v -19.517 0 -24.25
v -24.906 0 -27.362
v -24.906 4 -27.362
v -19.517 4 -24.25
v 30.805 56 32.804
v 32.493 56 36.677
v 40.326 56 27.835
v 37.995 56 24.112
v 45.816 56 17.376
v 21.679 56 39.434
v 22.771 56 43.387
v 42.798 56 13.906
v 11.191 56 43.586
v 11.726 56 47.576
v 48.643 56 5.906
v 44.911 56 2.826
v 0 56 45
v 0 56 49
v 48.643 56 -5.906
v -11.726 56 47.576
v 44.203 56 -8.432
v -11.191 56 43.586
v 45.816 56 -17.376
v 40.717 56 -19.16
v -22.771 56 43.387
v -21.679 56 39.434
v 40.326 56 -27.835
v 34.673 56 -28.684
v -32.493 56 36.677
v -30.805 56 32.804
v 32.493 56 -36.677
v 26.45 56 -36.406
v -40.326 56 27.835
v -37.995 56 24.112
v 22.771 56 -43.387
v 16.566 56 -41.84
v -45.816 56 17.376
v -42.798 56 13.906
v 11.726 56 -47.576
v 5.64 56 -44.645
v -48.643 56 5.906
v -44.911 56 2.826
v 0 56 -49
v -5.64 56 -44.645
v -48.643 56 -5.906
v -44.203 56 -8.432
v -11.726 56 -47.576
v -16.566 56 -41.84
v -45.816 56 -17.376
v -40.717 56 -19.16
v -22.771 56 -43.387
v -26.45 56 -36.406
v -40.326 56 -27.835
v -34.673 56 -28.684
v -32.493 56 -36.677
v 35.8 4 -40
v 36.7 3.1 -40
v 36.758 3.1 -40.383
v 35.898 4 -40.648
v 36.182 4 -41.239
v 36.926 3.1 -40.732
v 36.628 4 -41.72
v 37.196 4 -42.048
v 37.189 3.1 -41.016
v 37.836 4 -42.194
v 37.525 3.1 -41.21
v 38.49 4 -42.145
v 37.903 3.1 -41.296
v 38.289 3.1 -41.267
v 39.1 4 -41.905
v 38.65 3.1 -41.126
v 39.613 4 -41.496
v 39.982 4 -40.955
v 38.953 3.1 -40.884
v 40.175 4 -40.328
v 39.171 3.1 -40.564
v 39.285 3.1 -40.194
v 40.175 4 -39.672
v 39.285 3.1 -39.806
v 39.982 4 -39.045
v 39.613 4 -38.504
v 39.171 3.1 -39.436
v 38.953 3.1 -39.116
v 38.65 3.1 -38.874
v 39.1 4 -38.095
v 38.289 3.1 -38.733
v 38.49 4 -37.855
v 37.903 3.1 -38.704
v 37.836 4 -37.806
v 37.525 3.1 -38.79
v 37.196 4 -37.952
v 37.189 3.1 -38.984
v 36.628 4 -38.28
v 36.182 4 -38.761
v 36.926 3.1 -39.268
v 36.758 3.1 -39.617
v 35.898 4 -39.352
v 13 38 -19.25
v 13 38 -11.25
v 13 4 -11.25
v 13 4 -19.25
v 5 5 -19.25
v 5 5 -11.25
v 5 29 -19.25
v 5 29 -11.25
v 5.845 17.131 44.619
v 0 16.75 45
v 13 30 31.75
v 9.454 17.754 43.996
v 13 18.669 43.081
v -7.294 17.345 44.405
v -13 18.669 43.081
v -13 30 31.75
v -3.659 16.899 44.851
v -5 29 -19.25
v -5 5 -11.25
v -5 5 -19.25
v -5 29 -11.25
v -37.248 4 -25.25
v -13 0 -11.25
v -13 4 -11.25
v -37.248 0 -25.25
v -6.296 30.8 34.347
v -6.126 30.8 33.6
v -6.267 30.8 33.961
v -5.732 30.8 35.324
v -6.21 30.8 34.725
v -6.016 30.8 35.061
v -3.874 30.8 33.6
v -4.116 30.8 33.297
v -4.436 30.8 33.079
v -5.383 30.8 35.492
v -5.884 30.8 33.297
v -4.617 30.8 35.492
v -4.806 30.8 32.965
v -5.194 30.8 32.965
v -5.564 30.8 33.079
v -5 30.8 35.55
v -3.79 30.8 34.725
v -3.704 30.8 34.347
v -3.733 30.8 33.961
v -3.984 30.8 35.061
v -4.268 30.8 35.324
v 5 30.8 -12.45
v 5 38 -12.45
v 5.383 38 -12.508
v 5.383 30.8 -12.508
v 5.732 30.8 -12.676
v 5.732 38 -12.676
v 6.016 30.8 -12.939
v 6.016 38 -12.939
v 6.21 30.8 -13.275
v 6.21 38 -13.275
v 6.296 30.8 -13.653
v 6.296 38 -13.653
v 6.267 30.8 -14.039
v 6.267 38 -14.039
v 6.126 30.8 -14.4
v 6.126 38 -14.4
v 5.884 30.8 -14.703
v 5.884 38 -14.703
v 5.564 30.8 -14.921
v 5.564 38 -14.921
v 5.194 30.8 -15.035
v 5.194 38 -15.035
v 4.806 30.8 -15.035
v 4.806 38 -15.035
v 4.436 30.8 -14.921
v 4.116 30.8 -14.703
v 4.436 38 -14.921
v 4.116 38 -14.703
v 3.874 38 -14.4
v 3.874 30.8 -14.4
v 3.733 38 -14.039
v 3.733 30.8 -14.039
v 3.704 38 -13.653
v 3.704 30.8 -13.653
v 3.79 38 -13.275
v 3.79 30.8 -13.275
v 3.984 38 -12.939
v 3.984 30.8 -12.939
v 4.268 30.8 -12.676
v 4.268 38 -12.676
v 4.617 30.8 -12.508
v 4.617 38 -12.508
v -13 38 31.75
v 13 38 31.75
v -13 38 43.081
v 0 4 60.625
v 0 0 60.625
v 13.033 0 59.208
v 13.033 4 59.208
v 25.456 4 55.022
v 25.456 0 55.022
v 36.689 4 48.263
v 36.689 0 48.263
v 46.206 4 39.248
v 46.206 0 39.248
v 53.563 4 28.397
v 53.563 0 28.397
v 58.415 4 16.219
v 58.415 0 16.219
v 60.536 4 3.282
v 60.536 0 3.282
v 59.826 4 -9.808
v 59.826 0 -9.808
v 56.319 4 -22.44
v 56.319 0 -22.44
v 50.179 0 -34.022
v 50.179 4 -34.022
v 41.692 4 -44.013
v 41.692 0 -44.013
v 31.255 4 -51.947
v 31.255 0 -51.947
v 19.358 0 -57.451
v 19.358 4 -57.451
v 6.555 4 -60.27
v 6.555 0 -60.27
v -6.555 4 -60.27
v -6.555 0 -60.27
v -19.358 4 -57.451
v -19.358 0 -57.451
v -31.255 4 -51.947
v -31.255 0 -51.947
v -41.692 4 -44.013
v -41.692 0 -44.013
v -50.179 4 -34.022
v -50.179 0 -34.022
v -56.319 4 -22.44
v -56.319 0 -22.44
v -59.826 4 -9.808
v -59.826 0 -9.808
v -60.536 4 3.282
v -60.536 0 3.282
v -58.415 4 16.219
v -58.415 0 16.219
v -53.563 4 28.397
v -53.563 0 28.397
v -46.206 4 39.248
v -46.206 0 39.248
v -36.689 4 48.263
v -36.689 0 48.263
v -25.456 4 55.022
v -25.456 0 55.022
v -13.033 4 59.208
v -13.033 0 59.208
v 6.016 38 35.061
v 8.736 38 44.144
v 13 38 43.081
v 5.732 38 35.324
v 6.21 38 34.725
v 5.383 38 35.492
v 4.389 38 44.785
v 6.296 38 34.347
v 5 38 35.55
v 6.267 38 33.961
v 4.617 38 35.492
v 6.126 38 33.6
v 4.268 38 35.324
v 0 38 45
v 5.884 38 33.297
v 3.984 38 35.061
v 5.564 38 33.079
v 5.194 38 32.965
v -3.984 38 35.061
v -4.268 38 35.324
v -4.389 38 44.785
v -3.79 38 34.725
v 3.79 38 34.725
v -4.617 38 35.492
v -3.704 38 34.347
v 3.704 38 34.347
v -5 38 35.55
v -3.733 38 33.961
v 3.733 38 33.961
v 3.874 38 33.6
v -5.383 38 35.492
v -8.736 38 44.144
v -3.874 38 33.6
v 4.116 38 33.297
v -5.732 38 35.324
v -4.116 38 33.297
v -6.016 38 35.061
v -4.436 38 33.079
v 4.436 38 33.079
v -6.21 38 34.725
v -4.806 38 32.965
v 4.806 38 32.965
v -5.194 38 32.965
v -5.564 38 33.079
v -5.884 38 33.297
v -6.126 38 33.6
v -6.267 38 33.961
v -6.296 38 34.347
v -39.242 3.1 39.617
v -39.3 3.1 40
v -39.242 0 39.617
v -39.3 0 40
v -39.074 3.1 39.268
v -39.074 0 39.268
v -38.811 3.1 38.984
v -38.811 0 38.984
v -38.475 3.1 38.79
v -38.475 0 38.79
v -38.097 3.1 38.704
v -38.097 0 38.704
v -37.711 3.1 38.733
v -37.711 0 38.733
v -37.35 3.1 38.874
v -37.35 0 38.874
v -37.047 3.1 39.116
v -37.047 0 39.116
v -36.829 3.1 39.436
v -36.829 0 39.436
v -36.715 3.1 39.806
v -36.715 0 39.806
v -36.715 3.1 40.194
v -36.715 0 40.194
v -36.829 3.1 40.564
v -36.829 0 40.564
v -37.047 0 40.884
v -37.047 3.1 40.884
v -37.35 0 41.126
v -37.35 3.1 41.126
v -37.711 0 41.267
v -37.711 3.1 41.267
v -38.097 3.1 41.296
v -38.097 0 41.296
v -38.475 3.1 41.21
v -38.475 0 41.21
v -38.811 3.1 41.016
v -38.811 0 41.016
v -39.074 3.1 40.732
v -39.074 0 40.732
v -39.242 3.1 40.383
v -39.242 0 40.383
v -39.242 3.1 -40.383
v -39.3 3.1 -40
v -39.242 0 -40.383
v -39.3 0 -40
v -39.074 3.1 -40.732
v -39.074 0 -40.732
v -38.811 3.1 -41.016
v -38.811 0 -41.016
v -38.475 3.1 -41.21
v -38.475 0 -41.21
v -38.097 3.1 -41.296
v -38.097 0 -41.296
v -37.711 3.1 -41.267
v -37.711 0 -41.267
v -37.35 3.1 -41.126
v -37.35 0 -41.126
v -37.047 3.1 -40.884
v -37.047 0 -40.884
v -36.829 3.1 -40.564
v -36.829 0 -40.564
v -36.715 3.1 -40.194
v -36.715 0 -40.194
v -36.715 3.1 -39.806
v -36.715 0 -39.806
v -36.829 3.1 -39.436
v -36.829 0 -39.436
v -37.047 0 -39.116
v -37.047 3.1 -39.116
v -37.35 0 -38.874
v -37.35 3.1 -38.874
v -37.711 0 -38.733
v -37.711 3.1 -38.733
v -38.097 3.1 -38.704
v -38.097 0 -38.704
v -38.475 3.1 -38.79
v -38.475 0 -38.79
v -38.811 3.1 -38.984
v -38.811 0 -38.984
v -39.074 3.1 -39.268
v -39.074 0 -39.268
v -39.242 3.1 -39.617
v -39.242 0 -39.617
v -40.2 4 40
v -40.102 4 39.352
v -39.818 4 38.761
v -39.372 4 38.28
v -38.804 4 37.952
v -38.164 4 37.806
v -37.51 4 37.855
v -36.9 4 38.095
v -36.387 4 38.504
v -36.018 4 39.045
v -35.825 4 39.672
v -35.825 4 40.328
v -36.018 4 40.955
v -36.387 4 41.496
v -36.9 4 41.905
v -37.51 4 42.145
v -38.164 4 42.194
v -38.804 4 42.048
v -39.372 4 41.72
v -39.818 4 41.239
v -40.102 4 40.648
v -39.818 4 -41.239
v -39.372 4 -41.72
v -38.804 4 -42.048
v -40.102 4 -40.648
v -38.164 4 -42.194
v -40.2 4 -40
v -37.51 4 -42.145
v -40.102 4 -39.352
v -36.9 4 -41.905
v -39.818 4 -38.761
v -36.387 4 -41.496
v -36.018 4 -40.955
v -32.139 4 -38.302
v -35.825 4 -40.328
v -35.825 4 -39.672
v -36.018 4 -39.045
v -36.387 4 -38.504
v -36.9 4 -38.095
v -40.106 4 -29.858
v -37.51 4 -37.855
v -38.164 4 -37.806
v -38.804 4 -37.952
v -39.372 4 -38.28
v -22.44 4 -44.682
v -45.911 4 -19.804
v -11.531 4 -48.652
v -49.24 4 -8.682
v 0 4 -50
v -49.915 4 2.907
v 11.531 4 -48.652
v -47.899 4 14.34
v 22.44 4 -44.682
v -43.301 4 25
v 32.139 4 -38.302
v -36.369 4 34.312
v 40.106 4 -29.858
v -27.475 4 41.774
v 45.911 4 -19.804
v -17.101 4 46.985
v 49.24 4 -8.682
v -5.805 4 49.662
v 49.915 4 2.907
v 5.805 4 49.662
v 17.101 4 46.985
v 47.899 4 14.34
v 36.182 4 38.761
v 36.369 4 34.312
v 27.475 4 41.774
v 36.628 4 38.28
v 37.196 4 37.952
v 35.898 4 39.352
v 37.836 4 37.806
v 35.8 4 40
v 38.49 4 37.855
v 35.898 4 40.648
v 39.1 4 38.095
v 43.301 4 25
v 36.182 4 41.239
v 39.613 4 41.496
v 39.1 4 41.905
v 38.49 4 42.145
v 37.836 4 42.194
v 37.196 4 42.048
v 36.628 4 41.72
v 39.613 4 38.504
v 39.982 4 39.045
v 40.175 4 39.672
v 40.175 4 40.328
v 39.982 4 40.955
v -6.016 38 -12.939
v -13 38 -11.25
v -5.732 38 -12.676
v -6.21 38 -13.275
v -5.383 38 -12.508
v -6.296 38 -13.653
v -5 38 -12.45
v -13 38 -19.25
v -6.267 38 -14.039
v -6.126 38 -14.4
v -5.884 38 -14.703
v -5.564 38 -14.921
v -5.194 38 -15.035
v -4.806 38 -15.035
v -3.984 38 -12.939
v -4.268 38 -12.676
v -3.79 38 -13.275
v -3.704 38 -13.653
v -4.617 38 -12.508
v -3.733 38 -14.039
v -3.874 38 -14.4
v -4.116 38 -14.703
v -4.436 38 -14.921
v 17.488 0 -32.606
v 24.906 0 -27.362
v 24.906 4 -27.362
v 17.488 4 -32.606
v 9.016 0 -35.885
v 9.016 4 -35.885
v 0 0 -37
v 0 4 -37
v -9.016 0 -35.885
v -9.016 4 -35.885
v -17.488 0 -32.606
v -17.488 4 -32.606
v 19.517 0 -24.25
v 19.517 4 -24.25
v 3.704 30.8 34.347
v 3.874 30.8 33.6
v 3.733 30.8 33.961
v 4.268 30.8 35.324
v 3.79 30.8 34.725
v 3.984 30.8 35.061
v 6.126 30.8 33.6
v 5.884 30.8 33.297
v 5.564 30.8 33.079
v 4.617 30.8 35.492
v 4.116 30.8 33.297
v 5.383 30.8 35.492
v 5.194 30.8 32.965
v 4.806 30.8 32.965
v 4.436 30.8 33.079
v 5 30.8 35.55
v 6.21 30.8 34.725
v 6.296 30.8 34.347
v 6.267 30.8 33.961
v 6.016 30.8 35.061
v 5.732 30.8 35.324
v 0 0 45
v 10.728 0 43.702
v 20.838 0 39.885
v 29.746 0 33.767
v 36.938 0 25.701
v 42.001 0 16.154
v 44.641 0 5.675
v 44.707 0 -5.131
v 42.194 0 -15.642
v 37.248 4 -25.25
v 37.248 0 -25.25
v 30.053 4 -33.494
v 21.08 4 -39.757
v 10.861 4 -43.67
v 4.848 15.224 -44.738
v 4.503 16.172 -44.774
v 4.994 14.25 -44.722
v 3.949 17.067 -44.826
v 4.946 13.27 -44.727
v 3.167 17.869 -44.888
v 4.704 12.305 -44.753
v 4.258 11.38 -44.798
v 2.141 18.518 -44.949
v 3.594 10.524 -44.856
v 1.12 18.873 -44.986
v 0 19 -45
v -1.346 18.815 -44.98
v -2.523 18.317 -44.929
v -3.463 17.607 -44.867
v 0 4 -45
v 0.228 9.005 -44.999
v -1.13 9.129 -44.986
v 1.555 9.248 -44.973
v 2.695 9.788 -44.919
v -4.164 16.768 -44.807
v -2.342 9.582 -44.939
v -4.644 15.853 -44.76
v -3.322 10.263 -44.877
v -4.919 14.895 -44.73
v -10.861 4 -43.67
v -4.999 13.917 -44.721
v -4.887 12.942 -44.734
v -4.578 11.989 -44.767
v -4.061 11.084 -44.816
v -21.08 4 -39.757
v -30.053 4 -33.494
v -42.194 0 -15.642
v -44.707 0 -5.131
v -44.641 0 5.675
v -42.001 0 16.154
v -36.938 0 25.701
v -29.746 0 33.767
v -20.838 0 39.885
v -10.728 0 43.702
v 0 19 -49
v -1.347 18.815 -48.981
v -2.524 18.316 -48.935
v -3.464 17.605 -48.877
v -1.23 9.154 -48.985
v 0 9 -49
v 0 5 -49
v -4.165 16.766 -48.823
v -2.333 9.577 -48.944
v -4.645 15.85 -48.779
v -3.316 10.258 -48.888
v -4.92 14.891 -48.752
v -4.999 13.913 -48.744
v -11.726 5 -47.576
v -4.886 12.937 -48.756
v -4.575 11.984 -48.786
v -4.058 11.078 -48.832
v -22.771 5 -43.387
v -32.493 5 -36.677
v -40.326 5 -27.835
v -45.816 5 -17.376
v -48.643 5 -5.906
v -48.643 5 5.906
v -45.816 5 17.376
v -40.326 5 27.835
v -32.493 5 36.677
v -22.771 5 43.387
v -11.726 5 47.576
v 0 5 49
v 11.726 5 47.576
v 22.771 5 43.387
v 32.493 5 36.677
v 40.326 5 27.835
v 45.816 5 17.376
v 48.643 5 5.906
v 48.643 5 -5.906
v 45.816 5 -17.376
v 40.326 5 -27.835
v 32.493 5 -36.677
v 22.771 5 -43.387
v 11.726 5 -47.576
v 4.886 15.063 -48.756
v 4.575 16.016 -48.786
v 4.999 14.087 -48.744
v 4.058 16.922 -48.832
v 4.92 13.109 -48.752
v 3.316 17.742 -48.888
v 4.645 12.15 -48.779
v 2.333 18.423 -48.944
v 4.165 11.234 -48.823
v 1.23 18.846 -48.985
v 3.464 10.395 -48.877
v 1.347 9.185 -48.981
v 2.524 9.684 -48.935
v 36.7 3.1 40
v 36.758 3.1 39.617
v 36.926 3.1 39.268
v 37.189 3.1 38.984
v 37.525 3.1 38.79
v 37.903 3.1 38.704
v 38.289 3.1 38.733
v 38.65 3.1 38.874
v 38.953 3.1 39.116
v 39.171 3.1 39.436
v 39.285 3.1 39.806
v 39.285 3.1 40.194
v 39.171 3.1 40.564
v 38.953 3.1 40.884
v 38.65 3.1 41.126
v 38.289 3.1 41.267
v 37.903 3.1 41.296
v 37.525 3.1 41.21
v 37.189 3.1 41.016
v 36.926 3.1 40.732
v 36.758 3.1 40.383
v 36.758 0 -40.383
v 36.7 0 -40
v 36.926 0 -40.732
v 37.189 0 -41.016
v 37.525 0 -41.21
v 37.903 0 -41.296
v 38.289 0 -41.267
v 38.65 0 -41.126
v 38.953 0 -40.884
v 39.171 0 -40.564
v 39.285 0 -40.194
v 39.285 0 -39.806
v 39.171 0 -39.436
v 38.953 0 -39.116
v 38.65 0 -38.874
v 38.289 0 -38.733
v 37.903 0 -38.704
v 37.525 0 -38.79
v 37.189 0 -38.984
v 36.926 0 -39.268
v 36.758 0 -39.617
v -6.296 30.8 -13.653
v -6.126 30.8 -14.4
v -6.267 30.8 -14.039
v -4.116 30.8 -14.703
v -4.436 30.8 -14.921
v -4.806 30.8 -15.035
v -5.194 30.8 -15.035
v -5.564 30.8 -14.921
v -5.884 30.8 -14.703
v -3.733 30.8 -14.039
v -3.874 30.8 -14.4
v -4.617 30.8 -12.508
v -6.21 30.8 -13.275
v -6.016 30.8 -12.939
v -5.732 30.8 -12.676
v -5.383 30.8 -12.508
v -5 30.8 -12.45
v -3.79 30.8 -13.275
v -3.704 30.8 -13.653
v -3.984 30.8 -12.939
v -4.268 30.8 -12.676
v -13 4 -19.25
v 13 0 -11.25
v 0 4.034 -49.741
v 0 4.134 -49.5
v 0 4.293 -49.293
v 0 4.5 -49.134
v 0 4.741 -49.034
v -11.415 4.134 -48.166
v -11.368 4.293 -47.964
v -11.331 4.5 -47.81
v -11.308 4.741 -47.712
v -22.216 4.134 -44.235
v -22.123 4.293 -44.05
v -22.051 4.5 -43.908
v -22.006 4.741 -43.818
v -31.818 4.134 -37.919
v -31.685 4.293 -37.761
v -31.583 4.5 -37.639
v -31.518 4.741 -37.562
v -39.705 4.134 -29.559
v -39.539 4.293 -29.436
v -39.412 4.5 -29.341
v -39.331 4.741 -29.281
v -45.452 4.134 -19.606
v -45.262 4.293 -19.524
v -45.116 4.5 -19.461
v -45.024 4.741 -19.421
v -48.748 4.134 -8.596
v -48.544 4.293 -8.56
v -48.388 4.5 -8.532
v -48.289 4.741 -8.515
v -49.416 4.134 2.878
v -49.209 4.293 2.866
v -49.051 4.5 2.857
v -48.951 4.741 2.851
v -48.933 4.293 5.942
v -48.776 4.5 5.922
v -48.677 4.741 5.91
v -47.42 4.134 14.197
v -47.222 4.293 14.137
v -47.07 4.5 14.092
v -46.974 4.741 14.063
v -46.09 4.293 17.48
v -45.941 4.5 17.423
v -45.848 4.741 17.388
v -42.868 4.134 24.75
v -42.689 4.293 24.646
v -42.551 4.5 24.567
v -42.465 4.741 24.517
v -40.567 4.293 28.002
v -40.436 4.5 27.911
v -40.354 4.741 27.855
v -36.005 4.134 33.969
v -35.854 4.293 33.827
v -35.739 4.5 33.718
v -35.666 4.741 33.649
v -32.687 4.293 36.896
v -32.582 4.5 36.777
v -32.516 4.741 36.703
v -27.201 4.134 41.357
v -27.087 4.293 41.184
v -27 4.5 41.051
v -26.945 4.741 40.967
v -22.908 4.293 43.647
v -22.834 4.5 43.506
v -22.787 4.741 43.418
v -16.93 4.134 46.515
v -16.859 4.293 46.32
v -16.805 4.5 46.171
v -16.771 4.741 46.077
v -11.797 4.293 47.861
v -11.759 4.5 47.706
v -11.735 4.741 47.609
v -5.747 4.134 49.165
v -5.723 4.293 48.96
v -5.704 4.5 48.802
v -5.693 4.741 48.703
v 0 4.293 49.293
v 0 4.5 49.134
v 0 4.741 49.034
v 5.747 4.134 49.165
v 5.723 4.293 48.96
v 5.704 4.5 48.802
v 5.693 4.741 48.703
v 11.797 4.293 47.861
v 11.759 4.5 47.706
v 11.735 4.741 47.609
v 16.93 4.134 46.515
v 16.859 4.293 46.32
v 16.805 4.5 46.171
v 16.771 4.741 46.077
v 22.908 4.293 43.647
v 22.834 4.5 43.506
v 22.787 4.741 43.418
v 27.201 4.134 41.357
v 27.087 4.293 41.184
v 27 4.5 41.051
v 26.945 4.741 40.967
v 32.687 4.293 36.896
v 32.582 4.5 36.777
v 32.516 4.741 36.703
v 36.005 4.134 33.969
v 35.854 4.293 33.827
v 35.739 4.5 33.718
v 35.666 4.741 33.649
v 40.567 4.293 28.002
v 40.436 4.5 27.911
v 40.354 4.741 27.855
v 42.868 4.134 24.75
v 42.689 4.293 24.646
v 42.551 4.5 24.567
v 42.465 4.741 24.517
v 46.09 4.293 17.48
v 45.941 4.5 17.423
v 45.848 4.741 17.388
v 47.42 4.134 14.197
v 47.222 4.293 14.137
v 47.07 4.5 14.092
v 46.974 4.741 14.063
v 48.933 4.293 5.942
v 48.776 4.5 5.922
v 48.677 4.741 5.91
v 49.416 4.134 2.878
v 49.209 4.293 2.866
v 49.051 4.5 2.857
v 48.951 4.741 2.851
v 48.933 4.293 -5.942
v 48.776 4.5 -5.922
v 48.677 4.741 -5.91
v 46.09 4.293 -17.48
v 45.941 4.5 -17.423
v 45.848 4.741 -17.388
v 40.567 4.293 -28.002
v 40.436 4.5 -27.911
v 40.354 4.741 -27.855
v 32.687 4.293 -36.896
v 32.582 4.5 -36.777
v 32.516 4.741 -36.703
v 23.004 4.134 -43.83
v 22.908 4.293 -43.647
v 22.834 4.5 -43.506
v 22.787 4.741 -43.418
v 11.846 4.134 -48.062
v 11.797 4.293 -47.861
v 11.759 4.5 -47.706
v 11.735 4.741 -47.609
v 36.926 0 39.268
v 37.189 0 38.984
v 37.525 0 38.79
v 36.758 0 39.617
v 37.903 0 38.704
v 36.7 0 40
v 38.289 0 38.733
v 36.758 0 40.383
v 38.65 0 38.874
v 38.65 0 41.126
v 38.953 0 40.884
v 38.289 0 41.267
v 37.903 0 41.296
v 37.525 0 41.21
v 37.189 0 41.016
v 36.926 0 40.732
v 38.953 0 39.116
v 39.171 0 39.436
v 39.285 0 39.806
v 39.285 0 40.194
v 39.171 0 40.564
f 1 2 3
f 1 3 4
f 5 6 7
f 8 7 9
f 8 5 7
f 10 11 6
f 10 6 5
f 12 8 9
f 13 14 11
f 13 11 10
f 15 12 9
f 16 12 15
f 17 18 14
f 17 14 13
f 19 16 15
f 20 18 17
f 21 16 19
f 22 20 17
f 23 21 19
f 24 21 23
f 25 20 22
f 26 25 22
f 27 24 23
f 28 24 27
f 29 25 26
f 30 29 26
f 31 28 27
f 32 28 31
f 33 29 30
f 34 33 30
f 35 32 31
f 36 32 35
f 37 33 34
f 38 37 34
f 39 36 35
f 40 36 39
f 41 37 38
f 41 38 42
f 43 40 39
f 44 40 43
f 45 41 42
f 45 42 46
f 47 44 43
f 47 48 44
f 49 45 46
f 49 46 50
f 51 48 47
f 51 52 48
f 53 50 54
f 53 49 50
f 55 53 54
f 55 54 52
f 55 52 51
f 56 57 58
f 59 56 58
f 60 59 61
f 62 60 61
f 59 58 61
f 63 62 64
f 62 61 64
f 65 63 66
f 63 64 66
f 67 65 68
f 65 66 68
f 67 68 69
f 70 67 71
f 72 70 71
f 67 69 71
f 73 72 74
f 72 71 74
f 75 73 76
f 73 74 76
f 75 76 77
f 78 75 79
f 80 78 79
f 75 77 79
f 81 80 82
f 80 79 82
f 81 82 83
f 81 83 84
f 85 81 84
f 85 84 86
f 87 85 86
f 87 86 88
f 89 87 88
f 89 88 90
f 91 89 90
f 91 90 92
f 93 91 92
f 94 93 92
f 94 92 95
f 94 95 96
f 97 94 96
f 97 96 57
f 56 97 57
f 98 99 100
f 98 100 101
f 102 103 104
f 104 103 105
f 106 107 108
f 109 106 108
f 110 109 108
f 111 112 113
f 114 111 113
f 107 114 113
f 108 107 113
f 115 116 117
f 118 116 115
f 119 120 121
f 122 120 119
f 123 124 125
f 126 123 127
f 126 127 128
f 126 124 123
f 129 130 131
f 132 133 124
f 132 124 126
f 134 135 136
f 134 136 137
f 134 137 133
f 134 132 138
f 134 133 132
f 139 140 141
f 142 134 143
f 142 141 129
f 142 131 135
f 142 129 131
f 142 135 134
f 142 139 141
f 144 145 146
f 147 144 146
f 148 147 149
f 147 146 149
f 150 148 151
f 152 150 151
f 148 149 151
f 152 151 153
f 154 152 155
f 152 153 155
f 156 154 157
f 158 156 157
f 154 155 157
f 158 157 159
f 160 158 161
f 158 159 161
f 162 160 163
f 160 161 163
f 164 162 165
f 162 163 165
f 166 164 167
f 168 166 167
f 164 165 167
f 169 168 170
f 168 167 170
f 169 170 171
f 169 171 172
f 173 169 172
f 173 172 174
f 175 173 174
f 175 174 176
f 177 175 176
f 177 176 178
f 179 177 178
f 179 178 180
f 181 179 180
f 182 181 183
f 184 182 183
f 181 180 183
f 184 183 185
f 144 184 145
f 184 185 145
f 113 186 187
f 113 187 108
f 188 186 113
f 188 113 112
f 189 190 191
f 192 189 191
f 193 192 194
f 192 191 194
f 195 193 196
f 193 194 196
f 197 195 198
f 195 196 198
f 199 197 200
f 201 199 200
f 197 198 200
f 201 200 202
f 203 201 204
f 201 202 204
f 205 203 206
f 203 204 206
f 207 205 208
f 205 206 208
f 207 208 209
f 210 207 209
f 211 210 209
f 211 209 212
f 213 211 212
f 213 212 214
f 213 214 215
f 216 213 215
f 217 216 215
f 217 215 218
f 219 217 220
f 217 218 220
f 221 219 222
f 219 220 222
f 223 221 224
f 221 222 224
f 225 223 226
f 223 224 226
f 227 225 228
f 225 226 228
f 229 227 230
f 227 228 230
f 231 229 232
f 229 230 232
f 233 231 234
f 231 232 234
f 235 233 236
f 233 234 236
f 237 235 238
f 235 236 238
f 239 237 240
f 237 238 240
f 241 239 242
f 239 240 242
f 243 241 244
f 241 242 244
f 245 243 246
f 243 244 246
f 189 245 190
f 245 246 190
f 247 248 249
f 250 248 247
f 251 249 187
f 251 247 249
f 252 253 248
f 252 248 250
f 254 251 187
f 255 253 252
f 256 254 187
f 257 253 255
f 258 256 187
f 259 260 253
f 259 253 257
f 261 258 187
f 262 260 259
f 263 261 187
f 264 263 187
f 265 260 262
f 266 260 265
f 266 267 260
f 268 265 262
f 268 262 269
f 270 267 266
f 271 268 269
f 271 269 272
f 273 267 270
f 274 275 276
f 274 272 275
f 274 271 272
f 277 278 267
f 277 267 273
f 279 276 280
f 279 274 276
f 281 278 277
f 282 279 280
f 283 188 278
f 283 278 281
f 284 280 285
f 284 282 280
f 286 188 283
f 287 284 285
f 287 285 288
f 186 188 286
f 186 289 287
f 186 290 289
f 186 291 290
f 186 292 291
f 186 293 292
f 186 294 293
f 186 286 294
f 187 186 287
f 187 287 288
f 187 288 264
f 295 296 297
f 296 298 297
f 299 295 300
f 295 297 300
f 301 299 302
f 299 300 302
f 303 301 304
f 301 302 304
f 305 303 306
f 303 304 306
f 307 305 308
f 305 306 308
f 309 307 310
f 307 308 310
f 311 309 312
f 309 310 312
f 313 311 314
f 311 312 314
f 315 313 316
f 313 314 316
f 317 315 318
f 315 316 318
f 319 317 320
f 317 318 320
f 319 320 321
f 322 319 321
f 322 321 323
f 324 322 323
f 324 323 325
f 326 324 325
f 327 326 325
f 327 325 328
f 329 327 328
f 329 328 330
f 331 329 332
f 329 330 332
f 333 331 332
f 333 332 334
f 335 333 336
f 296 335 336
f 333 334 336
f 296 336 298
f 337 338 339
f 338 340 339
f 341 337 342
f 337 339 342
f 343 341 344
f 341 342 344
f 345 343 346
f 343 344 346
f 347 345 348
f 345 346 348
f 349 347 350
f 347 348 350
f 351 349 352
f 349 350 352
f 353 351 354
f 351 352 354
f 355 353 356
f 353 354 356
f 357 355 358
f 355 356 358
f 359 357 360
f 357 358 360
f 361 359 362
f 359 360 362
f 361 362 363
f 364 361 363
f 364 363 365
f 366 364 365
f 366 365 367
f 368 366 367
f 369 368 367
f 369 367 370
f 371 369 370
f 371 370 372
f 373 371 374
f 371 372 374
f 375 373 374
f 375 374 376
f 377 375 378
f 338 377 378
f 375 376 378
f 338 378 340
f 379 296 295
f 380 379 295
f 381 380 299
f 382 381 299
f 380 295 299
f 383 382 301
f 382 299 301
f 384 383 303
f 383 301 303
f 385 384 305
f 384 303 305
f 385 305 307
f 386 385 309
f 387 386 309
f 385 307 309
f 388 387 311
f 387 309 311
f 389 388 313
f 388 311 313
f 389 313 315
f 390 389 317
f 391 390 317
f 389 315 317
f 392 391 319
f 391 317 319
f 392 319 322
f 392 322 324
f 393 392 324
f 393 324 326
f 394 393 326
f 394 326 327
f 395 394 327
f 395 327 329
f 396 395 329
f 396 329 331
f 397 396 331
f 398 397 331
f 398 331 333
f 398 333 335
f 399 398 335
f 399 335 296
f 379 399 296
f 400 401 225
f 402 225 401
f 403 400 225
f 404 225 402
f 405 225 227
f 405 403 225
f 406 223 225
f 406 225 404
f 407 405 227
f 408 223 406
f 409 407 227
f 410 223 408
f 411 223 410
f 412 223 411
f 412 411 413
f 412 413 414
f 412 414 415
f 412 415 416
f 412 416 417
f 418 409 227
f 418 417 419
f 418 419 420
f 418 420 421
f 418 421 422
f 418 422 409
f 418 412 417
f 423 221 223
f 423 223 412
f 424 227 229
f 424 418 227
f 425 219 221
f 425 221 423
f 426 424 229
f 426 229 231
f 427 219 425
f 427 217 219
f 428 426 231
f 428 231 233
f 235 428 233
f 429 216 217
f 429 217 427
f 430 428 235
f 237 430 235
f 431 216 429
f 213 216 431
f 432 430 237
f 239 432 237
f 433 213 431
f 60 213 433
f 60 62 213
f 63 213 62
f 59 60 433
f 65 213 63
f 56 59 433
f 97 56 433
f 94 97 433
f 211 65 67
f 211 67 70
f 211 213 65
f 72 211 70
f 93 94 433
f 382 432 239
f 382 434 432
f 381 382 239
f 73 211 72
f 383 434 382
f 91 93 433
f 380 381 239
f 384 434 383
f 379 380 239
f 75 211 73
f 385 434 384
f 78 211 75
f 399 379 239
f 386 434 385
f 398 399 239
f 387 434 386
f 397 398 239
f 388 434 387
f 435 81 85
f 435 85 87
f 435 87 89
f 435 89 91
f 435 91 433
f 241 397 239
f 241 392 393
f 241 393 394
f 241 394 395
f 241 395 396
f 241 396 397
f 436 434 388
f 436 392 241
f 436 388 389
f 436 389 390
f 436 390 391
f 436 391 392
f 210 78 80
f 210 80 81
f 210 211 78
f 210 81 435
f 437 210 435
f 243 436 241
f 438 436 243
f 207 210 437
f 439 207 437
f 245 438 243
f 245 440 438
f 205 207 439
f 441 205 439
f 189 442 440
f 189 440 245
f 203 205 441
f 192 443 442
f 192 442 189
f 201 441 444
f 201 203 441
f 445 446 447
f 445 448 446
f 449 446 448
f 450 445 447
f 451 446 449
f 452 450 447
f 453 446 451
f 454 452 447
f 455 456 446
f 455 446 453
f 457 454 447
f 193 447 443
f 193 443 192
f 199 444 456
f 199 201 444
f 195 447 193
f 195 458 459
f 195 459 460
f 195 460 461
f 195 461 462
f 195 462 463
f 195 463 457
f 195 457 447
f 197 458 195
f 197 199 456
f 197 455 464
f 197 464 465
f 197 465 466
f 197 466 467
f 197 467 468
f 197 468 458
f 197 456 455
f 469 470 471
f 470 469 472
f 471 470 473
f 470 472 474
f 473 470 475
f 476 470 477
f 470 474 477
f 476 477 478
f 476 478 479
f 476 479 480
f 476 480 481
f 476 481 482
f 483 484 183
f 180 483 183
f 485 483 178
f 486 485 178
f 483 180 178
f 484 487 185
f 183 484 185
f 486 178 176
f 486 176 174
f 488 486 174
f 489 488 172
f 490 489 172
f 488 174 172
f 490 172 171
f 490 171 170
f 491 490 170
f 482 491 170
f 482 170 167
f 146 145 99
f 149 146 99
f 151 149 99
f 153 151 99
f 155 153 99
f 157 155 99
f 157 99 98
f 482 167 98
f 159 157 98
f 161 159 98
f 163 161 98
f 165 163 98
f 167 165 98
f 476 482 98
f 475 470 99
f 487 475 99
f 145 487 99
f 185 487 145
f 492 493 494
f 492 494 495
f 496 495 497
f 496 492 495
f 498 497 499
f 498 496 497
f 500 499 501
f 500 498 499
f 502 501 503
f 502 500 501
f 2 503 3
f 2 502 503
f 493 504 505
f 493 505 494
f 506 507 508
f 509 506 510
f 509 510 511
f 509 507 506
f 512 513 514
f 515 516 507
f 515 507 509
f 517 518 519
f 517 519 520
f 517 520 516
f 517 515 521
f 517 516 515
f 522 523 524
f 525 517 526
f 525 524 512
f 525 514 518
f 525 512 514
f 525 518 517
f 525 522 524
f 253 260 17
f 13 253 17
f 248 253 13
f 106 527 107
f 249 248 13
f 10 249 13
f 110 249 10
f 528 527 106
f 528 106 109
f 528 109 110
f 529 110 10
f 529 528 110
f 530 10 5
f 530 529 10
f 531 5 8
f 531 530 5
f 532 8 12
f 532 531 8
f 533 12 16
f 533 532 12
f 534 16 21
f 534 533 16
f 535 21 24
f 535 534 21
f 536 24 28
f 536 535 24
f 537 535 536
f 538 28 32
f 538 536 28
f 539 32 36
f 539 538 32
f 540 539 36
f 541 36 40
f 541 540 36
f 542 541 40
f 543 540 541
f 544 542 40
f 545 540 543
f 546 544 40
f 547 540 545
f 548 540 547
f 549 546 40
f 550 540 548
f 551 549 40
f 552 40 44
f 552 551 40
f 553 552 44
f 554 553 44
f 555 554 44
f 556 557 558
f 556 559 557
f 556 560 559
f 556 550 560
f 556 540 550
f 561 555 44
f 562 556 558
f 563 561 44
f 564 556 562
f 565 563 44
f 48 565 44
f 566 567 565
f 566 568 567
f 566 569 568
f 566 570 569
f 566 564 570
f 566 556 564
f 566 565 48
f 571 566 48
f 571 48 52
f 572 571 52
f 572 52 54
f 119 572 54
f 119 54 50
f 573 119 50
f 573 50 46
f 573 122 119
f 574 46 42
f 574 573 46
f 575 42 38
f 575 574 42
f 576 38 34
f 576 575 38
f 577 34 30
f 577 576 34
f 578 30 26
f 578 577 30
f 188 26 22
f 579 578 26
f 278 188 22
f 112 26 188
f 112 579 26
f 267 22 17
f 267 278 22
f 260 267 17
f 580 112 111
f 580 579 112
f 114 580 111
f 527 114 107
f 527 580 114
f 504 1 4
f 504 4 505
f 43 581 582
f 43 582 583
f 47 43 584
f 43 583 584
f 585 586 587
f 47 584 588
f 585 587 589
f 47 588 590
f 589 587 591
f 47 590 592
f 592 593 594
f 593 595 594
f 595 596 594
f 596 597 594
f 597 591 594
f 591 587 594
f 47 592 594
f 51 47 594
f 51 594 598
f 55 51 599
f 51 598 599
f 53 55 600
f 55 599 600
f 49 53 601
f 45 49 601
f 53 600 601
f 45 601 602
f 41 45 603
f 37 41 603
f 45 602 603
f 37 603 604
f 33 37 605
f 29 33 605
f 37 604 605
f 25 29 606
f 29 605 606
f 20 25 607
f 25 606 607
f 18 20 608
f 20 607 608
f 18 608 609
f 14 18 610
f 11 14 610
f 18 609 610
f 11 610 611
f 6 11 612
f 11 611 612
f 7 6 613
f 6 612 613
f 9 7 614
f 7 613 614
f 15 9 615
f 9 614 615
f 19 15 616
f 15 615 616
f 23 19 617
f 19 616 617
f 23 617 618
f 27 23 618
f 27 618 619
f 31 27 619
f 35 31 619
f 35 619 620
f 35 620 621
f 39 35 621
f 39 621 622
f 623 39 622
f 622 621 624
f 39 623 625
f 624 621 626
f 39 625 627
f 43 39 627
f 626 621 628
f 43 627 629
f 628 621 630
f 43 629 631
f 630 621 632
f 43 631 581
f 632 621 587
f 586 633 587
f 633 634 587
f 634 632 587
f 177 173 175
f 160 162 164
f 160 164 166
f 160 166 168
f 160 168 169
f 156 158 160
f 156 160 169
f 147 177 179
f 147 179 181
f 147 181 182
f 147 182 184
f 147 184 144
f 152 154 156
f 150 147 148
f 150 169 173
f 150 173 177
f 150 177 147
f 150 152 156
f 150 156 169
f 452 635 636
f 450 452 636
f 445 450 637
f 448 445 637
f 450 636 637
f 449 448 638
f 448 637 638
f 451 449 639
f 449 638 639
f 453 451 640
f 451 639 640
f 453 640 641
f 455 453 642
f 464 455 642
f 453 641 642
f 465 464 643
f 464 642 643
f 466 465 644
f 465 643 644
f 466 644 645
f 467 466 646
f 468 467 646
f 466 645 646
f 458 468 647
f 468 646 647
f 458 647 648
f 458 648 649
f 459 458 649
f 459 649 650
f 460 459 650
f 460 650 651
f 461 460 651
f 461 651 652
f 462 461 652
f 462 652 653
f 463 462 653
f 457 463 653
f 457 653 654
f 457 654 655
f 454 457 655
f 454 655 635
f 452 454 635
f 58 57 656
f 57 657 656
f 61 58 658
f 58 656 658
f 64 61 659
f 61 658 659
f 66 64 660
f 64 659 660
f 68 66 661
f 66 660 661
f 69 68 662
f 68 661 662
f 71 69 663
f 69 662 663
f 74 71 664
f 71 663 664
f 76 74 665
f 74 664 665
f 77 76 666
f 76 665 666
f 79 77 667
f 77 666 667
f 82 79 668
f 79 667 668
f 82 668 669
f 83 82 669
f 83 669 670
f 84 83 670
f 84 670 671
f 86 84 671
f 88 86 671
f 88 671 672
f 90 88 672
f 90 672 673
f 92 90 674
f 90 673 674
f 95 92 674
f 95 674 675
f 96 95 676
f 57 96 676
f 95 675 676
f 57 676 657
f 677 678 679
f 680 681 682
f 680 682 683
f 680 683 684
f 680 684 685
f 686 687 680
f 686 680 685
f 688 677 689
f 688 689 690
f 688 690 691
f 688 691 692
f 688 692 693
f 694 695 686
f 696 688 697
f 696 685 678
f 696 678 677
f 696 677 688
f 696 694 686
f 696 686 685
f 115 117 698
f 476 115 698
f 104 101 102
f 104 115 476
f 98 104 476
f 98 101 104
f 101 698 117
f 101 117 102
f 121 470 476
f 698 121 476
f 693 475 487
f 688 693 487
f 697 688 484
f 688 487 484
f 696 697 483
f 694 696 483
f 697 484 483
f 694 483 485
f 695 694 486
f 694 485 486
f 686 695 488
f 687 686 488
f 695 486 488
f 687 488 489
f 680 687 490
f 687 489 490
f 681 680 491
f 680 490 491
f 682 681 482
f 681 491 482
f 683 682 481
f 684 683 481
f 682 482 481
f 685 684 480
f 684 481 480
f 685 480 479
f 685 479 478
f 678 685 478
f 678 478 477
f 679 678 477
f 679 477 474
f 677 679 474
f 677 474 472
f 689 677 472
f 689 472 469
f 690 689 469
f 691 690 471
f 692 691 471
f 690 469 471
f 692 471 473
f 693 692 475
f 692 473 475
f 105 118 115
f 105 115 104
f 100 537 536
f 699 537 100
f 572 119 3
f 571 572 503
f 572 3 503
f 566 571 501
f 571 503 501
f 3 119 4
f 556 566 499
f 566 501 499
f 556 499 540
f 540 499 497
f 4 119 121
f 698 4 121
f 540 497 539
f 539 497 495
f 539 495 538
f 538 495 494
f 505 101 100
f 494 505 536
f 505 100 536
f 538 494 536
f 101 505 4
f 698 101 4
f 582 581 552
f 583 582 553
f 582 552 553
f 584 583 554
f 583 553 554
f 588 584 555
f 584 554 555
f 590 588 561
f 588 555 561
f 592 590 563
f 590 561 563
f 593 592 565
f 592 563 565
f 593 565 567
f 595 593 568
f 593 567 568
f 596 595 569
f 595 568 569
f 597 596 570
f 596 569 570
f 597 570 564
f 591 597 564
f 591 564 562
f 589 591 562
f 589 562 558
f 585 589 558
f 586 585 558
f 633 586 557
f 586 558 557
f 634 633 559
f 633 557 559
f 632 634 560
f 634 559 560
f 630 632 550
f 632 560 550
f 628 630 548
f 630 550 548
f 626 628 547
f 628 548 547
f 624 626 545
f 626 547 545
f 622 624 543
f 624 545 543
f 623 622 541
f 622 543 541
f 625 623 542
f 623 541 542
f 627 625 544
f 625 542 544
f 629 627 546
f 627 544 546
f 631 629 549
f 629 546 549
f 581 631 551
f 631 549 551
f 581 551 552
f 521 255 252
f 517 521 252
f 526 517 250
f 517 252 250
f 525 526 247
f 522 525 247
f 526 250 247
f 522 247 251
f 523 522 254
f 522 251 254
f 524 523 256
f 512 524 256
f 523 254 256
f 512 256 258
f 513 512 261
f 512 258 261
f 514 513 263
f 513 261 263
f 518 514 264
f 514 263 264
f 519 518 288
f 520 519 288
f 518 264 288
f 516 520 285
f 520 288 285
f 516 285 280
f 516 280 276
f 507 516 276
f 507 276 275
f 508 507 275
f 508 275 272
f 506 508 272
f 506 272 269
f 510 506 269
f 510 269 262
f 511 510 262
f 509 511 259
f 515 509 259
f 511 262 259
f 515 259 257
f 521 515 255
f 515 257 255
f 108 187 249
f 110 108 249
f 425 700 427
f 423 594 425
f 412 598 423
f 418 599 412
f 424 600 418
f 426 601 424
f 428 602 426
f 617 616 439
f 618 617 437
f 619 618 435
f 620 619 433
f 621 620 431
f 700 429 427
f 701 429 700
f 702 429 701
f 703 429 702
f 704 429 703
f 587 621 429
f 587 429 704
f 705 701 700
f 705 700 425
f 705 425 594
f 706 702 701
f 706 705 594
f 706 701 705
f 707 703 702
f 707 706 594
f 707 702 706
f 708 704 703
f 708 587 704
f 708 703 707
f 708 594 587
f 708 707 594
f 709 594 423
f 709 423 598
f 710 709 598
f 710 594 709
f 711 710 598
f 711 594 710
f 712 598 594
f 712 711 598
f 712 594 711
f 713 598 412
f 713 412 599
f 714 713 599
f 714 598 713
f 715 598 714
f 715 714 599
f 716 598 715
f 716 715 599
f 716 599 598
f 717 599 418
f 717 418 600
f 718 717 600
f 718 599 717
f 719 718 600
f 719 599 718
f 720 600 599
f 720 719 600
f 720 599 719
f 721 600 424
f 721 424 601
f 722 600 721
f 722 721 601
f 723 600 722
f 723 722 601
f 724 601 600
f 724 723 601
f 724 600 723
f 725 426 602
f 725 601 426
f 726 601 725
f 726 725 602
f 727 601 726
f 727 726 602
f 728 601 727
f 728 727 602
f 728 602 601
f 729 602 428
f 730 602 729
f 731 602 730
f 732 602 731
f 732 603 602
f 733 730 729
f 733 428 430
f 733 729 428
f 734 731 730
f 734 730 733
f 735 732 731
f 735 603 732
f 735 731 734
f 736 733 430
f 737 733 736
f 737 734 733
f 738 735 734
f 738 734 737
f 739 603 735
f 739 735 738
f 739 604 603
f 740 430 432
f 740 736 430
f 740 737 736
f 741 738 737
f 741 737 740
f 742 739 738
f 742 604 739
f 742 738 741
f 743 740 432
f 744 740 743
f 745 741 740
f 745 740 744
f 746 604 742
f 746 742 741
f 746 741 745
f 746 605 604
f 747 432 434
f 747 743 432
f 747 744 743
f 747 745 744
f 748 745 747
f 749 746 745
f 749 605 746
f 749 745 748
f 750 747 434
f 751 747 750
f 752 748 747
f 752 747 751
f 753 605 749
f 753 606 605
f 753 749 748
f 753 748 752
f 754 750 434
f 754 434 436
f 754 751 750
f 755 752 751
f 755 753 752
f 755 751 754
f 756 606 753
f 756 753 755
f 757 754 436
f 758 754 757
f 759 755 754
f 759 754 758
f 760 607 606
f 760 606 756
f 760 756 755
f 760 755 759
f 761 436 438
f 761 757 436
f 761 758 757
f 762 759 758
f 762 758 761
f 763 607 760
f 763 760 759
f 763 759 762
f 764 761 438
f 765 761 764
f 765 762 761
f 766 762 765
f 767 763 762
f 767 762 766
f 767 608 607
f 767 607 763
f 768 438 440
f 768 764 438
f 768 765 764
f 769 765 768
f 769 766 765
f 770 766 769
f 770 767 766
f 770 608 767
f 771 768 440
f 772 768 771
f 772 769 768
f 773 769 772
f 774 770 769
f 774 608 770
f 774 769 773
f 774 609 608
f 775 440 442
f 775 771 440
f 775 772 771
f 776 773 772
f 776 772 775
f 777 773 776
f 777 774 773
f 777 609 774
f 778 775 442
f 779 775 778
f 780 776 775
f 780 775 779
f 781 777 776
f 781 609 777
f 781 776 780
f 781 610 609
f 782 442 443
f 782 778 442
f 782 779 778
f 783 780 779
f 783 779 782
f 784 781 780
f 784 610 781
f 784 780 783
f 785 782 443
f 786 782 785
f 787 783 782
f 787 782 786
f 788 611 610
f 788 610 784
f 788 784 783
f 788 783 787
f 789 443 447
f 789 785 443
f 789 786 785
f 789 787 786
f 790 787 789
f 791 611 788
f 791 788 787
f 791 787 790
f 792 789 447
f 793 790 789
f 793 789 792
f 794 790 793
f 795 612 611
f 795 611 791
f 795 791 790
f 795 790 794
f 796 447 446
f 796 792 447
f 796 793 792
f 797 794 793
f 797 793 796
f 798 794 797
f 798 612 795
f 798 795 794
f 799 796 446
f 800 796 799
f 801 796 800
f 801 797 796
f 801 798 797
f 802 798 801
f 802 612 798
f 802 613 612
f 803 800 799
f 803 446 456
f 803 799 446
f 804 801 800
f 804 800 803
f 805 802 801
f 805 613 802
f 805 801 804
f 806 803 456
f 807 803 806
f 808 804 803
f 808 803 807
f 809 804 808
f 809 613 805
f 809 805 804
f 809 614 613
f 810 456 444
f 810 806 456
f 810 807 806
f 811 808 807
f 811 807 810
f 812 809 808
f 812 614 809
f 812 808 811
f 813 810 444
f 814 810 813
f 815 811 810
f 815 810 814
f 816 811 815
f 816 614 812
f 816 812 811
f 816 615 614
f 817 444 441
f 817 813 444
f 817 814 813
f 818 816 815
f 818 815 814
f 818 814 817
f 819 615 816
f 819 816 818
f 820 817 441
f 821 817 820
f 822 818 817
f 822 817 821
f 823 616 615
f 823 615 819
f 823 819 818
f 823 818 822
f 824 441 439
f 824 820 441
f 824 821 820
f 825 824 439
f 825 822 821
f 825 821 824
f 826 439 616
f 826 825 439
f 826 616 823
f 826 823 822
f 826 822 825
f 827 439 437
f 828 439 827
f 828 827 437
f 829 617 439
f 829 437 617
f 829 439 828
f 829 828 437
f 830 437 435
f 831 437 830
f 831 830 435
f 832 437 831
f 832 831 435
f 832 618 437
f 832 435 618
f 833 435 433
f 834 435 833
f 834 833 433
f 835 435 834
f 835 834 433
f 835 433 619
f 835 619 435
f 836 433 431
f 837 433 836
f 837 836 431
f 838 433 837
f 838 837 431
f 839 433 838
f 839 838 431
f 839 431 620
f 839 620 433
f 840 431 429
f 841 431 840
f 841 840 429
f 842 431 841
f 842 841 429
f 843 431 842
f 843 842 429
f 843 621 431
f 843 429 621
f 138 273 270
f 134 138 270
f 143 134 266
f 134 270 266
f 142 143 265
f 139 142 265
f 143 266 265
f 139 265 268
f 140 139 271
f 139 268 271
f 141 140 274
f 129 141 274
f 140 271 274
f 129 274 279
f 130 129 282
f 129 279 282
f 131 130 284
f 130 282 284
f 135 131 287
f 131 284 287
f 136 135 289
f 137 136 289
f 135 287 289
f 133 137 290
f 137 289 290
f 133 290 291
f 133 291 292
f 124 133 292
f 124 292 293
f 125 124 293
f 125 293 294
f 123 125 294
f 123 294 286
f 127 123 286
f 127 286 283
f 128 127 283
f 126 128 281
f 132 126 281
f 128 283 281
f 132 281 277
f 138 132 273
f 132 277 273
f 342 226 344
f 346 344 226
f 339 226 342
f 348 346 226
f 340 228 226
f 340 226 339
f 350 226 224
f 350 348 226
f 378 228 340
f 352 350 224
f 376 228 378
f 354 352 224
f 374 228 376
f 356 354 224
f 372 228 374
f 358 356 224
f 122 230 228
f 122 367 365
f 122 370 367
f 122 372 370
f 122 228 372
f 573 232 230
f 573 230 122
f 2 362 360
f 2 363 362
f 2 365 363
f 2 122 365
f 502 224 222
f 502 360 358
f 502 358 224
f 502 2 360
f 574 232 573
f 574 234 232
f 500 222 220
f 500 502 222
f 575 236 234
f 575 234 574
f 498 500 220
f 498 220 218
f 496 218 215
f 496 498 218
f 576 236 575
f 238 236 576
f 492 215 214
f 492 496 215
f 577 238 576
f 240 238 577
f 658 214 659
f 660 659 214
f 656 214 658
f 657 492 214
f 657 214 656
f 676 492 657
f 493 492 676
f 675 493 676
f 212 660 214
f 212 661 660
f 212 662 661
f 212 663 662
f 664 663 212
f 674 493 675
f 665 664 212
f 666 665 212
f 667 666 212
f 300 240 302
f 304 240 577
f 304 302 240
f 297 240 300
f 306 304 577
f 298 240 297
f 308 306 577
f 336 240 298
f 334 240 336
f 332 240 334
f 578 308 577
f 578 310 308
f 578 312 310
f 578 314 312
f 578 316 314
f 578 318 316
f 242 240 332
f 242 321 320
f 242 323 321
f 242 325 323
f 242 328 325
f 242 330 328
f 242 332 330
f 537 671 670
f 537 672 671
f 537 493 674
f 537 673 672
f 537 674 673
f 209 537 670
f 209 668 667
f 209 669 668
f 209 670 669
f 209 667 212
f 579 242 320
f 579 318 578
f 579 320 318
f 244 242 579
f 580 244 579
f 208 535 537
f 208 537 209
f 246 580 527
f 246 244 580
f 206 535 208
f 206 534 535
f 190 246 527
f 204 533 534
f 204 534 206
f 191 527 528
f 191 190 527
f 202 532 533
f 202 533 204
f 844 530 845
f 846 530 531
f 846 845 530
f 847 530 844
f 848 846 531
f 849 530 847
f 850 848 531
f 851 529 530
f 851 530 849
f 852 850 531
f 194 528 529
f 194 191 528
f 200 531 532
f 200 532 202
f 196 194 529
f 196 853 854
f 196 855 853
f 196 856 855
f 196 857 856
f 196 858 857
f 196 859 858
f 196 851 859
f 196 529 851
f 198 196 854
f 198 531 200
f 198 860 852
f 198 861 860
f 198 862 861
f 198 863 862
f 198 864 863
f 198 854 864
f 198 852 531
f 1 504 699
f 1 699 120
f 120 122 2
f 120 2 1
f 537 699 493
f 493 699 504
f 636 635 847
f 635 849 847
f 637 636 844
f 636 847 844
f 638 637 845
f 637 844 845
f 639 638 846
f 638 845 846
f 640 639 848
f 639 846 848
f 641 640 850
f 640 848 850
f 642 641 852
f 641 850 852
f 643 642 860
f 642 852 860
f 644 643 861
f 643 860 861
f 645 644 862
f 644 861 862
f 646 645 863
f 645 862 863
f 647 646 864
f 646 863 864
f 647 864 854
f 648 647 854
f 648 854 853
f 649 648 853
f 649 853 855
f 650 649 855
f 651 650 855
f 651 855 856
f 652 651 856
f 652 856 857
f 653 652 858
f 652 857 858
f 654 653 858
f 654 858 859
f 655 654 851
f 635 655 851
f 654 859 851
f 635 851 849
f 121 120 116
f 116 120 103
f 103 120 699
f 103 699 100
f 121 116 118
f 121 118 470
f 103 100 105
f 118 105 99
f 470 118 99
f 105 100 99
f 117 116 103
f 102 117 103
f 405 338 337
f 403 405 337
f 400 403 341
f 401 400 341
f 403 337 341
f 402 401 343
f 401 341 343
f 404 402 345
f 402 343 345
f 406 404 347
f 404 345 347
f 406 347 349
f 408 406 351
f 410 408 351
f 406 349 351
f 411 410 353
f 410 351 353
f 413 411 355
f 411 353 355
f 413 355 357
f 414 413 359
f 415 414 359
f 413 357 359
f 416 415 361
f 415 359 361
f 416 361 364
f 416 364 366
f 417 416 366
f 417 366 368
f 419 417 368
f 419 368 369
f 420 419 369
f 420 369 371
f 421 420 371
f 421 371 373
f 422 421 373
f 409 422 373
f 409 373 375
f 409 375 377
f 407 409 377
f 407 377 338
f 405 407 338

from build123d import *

# Parameters (mm, degrees)
SKETCH3_R                                            = 60.625
SKETCH3_R_2                                          = 45
BOSS_EXTRUDE1_DEPTH                                  = 4
SKETCH5_R                                            = 49
SKETCH5_R_2                                          = 45
BOSS_EXTRUDE2_DEPTH                                  = 52
SKETCH6_W                                            = 8
SKETCH6_H                                            = 38
BOSS_EXTRUDE3_DEPTH                                  = 13
SKETCH7_W                                            = 10
SKETCH7_H                                            = 24
CUT_EXTRUDE1_DEPTH                                   = 26
SKETCH8_R                                            = 5
CUT_EXTRUDE2_DEPTH                                   = 55
SKETCH9_R                                            = 1.3
CUT_EXTRUDE5_DEPTH                                   = 7.2
BOSS_EXTRUDE5_DEPTH                                  = 4
CSK_FOR_ST2_2_CROSS_RECESSED_CTSK_HEAD_T_D           = 2.6
CSK_FOR_ST2_2_CROSS_RECESSED_CTSK_HEAD_T_CSINK_D     = 4.4
CSK_FOR_ST2_2_CROSS_RECESSED_CTSK_HEAD_T_CSINK_ANGLE = 90
FILLET1_R                                            = 1


with BuildPart() as part:
    # Sketch3 → Boss-Extrude1 (new body)
    with BuildSketch(Plane(origin=(0, 0, 0), x_dir=(1, 0, 0), z_dir=(0, 1, 0))):
        with Locations(Location((0, 0, 0), (0, 0, 270))):
            Circle(SKETCH3_R)
        with Locations(Location((0, 0, 0), (0, 0, 270))):
            Circle(SKETCH3_R_2, mode=Mode.SUBTRACT)
    extrude(amount=BOSS_EXTRUDE1_DEPTH)

    # Sketch5 → Boss-Extrude2 (add)
    with BuildSketch(Plane(origin=(0, 4, 0), x_dir=(1, 0, 0), z_dir=(0, 1, 0))):
        with Locations(Location((0, 0, 0), (0, 0, 90))):
            Circle(SKETCH5_R)
        with Locations(Location((0, 0, 0), (0, 0, 270))):
            Circle(SKETCH5_R_2, mode=Mode.SUBTRACT)
    extrude(amount=BOSS_EXTRUDE2_DEPTH)

    # Sketch6 → Boss-Extrude3 (add, symmetric)
    with BuildSketch(Plane(origin=(0, 0, 0), x_dir=(0, 0, -1), z_dir=(1, 0, 0))):
        Polygon((-46.75, 38), (-31.75, 38), (-31.75, 30), (-45, 16.75), (-46.75, 15), (-46.75, 30), align=None)
        with Locations((15.25, 19)):
            Rectangle(SKETCH6_W, SKETCH6_H)
    extrude(amount=BOSS_EXTRUDE3_DEPTH, both=True)


with BuildPart() as boss_extrude3_piece_1:
    # of the separate pieces the step leaves, piece 1, a body of its own (boss_extrude3_pieces)
    add(part.part.solids().sort_by_distance((0, 0, 60.625))[0])

    # Sketch8 → Cut-Extrude2 (cut)
    with BuildSketch(Plane.XY.offset(-11.25)):
        with Locations(Location((0, 14, 0), (0, 0, 90))):
            Circle(SKETCH8_R)
    extrude(amount=-CUT_EXTRUDE2_DEPTH, mode=Mode.SUBTRACT)


with BuildPart() as boss_extrude3_piece_2:
    # of the separate pieces the step leaves, piece 2, a body of its own (boss_extrude3_pieces)
    add(part.part.solids().sort_by_distance((-13, 38, -11.25))[0])

    # Sketch7 → Cut-Extrude1 (cut)
    with BuildSketch(Plane.XY.offset(-11.25)):
        with Locations((0, 17)):
            Rectangle(SKETCH7_W, SKETCH7_H)
    extrude(amount=-CUT_EXTRUDE1_DEPTH, mode=Mode.SUBTRACT)


with BuildPart() as cut_extrude5_tool:
    # Sketch9 → Cut-Extrude5 (new body)
    with BuildSketch(Plane(origin=(0, 38, 0), x_dir=(1, 0, 0), z_dir=(0, 1, 0))):
        with Locations(Location((5, 13.75, 0), (0, 0, 270))):
            Circle(SKETCH9_R)
        with Locations(Location((5, -34.25, 0), (0, 0, 270))):
            Circle(SKETCH9_R)
        with Locations(Location((-5, -34.25, 0), (0, 0, 270))):
            Circle(SKETCH9_R)
        with Locations(Location((-5, 13.75, 0), (0, 0, 270))):
            Circle(SKETCH9_R)
    extrude(amount=-CUT_EXTRUDE5_DEPTH)


with BuildPart() as boss_extrude3_piece_1_1:
    add(boss_extrude3_piece_1.part)

    # Cut-Extrude5: cut by cut_extrude5_tool
    add(cut_extrude5_tool.part, mode=Mode.SUBTRACT)



with BuildPart() as boss_extrude3_piece_2_1:
    add(boss_extrude3_piece_2.part)

    # Cut-Extrude5: cut by cut_extrude5_tool
    add(cut_extrude5_tool.part, mode=Mode.SUBTRACT)


with BuildPart() as boss_extrude3_piece_1_2:
    add(boss_extrude3_piece_1_1.part)

    add(boss_extrude3_piece_2_1.part)  # Boss-Extrude5 merges Boss-Extrude3 piece 2
    # Sketch10 → Boss-Extrude5 (add)
    with BuildSketch(Plane.XZ):
        with BuildLine():
            Line((37.248431585, -25.249838503), (13, -11.25))
            Line((13, -11.25), (-13, -11.25))
            Line((-13, -11.25), (-37.248431585, -25.249838503))
            ThreePointArc((-37.248431585, -25.249838503), (0, -45), (37.248431585, -25.249838503))
        make_face()
        with BuildLine():
            Line((-19.516660498, -24.25), (19.516660498, -24.25))
            Line((19.516660498, -24.25), (24.906460381, -27.361802413))
            ThreePointArc((24.906460381, -27.361802413), (0, -37), (-24.906460381, -27.361802413))
            Line((-24.906460381, -27.361802413), (-19.516660498, -24.25))
        make_face(mode=Mode.SUBTRACT)
    extrude(amount=-BOSS_EXTRUDE5_DEPTH)

    # CSK for ST2.2 Cross recessed CTSK head tapping screws1 (through all)
    with Locations(Plane(origin=(0, 4, 0), x_dir=(1, 0, 0), z_dir=(0, 1, 0))):
        with Locations((0, 0), (38, -40), (-38, 40), (-38, -40), (38, 40)):
            CounterSinkHole(CSK_FOR_ST2_2_CROSS_RECESSED_CTSK_HEAD_T_D / 2, CSK_FOR_ST2_2_CROSS_RECESSED_CTSK_HEAD_T_CSINK_D / 2, counter_sink_angle=CSK_FOR_ST2_2_CROSS_RECESSED_CTSK_HEAD_T_CSINK_ANGLE)

    # Fillet1
    fillet1_edges = [boss_extrude3_piece_1_2.edges().sort_by_distance(p)[0] for p in [
        (0, 4, 49),
    ]]
    fillet(fillet1_edges, radius=FILLET1_R)


solid = boss_extrude3_piece_1_2.part
